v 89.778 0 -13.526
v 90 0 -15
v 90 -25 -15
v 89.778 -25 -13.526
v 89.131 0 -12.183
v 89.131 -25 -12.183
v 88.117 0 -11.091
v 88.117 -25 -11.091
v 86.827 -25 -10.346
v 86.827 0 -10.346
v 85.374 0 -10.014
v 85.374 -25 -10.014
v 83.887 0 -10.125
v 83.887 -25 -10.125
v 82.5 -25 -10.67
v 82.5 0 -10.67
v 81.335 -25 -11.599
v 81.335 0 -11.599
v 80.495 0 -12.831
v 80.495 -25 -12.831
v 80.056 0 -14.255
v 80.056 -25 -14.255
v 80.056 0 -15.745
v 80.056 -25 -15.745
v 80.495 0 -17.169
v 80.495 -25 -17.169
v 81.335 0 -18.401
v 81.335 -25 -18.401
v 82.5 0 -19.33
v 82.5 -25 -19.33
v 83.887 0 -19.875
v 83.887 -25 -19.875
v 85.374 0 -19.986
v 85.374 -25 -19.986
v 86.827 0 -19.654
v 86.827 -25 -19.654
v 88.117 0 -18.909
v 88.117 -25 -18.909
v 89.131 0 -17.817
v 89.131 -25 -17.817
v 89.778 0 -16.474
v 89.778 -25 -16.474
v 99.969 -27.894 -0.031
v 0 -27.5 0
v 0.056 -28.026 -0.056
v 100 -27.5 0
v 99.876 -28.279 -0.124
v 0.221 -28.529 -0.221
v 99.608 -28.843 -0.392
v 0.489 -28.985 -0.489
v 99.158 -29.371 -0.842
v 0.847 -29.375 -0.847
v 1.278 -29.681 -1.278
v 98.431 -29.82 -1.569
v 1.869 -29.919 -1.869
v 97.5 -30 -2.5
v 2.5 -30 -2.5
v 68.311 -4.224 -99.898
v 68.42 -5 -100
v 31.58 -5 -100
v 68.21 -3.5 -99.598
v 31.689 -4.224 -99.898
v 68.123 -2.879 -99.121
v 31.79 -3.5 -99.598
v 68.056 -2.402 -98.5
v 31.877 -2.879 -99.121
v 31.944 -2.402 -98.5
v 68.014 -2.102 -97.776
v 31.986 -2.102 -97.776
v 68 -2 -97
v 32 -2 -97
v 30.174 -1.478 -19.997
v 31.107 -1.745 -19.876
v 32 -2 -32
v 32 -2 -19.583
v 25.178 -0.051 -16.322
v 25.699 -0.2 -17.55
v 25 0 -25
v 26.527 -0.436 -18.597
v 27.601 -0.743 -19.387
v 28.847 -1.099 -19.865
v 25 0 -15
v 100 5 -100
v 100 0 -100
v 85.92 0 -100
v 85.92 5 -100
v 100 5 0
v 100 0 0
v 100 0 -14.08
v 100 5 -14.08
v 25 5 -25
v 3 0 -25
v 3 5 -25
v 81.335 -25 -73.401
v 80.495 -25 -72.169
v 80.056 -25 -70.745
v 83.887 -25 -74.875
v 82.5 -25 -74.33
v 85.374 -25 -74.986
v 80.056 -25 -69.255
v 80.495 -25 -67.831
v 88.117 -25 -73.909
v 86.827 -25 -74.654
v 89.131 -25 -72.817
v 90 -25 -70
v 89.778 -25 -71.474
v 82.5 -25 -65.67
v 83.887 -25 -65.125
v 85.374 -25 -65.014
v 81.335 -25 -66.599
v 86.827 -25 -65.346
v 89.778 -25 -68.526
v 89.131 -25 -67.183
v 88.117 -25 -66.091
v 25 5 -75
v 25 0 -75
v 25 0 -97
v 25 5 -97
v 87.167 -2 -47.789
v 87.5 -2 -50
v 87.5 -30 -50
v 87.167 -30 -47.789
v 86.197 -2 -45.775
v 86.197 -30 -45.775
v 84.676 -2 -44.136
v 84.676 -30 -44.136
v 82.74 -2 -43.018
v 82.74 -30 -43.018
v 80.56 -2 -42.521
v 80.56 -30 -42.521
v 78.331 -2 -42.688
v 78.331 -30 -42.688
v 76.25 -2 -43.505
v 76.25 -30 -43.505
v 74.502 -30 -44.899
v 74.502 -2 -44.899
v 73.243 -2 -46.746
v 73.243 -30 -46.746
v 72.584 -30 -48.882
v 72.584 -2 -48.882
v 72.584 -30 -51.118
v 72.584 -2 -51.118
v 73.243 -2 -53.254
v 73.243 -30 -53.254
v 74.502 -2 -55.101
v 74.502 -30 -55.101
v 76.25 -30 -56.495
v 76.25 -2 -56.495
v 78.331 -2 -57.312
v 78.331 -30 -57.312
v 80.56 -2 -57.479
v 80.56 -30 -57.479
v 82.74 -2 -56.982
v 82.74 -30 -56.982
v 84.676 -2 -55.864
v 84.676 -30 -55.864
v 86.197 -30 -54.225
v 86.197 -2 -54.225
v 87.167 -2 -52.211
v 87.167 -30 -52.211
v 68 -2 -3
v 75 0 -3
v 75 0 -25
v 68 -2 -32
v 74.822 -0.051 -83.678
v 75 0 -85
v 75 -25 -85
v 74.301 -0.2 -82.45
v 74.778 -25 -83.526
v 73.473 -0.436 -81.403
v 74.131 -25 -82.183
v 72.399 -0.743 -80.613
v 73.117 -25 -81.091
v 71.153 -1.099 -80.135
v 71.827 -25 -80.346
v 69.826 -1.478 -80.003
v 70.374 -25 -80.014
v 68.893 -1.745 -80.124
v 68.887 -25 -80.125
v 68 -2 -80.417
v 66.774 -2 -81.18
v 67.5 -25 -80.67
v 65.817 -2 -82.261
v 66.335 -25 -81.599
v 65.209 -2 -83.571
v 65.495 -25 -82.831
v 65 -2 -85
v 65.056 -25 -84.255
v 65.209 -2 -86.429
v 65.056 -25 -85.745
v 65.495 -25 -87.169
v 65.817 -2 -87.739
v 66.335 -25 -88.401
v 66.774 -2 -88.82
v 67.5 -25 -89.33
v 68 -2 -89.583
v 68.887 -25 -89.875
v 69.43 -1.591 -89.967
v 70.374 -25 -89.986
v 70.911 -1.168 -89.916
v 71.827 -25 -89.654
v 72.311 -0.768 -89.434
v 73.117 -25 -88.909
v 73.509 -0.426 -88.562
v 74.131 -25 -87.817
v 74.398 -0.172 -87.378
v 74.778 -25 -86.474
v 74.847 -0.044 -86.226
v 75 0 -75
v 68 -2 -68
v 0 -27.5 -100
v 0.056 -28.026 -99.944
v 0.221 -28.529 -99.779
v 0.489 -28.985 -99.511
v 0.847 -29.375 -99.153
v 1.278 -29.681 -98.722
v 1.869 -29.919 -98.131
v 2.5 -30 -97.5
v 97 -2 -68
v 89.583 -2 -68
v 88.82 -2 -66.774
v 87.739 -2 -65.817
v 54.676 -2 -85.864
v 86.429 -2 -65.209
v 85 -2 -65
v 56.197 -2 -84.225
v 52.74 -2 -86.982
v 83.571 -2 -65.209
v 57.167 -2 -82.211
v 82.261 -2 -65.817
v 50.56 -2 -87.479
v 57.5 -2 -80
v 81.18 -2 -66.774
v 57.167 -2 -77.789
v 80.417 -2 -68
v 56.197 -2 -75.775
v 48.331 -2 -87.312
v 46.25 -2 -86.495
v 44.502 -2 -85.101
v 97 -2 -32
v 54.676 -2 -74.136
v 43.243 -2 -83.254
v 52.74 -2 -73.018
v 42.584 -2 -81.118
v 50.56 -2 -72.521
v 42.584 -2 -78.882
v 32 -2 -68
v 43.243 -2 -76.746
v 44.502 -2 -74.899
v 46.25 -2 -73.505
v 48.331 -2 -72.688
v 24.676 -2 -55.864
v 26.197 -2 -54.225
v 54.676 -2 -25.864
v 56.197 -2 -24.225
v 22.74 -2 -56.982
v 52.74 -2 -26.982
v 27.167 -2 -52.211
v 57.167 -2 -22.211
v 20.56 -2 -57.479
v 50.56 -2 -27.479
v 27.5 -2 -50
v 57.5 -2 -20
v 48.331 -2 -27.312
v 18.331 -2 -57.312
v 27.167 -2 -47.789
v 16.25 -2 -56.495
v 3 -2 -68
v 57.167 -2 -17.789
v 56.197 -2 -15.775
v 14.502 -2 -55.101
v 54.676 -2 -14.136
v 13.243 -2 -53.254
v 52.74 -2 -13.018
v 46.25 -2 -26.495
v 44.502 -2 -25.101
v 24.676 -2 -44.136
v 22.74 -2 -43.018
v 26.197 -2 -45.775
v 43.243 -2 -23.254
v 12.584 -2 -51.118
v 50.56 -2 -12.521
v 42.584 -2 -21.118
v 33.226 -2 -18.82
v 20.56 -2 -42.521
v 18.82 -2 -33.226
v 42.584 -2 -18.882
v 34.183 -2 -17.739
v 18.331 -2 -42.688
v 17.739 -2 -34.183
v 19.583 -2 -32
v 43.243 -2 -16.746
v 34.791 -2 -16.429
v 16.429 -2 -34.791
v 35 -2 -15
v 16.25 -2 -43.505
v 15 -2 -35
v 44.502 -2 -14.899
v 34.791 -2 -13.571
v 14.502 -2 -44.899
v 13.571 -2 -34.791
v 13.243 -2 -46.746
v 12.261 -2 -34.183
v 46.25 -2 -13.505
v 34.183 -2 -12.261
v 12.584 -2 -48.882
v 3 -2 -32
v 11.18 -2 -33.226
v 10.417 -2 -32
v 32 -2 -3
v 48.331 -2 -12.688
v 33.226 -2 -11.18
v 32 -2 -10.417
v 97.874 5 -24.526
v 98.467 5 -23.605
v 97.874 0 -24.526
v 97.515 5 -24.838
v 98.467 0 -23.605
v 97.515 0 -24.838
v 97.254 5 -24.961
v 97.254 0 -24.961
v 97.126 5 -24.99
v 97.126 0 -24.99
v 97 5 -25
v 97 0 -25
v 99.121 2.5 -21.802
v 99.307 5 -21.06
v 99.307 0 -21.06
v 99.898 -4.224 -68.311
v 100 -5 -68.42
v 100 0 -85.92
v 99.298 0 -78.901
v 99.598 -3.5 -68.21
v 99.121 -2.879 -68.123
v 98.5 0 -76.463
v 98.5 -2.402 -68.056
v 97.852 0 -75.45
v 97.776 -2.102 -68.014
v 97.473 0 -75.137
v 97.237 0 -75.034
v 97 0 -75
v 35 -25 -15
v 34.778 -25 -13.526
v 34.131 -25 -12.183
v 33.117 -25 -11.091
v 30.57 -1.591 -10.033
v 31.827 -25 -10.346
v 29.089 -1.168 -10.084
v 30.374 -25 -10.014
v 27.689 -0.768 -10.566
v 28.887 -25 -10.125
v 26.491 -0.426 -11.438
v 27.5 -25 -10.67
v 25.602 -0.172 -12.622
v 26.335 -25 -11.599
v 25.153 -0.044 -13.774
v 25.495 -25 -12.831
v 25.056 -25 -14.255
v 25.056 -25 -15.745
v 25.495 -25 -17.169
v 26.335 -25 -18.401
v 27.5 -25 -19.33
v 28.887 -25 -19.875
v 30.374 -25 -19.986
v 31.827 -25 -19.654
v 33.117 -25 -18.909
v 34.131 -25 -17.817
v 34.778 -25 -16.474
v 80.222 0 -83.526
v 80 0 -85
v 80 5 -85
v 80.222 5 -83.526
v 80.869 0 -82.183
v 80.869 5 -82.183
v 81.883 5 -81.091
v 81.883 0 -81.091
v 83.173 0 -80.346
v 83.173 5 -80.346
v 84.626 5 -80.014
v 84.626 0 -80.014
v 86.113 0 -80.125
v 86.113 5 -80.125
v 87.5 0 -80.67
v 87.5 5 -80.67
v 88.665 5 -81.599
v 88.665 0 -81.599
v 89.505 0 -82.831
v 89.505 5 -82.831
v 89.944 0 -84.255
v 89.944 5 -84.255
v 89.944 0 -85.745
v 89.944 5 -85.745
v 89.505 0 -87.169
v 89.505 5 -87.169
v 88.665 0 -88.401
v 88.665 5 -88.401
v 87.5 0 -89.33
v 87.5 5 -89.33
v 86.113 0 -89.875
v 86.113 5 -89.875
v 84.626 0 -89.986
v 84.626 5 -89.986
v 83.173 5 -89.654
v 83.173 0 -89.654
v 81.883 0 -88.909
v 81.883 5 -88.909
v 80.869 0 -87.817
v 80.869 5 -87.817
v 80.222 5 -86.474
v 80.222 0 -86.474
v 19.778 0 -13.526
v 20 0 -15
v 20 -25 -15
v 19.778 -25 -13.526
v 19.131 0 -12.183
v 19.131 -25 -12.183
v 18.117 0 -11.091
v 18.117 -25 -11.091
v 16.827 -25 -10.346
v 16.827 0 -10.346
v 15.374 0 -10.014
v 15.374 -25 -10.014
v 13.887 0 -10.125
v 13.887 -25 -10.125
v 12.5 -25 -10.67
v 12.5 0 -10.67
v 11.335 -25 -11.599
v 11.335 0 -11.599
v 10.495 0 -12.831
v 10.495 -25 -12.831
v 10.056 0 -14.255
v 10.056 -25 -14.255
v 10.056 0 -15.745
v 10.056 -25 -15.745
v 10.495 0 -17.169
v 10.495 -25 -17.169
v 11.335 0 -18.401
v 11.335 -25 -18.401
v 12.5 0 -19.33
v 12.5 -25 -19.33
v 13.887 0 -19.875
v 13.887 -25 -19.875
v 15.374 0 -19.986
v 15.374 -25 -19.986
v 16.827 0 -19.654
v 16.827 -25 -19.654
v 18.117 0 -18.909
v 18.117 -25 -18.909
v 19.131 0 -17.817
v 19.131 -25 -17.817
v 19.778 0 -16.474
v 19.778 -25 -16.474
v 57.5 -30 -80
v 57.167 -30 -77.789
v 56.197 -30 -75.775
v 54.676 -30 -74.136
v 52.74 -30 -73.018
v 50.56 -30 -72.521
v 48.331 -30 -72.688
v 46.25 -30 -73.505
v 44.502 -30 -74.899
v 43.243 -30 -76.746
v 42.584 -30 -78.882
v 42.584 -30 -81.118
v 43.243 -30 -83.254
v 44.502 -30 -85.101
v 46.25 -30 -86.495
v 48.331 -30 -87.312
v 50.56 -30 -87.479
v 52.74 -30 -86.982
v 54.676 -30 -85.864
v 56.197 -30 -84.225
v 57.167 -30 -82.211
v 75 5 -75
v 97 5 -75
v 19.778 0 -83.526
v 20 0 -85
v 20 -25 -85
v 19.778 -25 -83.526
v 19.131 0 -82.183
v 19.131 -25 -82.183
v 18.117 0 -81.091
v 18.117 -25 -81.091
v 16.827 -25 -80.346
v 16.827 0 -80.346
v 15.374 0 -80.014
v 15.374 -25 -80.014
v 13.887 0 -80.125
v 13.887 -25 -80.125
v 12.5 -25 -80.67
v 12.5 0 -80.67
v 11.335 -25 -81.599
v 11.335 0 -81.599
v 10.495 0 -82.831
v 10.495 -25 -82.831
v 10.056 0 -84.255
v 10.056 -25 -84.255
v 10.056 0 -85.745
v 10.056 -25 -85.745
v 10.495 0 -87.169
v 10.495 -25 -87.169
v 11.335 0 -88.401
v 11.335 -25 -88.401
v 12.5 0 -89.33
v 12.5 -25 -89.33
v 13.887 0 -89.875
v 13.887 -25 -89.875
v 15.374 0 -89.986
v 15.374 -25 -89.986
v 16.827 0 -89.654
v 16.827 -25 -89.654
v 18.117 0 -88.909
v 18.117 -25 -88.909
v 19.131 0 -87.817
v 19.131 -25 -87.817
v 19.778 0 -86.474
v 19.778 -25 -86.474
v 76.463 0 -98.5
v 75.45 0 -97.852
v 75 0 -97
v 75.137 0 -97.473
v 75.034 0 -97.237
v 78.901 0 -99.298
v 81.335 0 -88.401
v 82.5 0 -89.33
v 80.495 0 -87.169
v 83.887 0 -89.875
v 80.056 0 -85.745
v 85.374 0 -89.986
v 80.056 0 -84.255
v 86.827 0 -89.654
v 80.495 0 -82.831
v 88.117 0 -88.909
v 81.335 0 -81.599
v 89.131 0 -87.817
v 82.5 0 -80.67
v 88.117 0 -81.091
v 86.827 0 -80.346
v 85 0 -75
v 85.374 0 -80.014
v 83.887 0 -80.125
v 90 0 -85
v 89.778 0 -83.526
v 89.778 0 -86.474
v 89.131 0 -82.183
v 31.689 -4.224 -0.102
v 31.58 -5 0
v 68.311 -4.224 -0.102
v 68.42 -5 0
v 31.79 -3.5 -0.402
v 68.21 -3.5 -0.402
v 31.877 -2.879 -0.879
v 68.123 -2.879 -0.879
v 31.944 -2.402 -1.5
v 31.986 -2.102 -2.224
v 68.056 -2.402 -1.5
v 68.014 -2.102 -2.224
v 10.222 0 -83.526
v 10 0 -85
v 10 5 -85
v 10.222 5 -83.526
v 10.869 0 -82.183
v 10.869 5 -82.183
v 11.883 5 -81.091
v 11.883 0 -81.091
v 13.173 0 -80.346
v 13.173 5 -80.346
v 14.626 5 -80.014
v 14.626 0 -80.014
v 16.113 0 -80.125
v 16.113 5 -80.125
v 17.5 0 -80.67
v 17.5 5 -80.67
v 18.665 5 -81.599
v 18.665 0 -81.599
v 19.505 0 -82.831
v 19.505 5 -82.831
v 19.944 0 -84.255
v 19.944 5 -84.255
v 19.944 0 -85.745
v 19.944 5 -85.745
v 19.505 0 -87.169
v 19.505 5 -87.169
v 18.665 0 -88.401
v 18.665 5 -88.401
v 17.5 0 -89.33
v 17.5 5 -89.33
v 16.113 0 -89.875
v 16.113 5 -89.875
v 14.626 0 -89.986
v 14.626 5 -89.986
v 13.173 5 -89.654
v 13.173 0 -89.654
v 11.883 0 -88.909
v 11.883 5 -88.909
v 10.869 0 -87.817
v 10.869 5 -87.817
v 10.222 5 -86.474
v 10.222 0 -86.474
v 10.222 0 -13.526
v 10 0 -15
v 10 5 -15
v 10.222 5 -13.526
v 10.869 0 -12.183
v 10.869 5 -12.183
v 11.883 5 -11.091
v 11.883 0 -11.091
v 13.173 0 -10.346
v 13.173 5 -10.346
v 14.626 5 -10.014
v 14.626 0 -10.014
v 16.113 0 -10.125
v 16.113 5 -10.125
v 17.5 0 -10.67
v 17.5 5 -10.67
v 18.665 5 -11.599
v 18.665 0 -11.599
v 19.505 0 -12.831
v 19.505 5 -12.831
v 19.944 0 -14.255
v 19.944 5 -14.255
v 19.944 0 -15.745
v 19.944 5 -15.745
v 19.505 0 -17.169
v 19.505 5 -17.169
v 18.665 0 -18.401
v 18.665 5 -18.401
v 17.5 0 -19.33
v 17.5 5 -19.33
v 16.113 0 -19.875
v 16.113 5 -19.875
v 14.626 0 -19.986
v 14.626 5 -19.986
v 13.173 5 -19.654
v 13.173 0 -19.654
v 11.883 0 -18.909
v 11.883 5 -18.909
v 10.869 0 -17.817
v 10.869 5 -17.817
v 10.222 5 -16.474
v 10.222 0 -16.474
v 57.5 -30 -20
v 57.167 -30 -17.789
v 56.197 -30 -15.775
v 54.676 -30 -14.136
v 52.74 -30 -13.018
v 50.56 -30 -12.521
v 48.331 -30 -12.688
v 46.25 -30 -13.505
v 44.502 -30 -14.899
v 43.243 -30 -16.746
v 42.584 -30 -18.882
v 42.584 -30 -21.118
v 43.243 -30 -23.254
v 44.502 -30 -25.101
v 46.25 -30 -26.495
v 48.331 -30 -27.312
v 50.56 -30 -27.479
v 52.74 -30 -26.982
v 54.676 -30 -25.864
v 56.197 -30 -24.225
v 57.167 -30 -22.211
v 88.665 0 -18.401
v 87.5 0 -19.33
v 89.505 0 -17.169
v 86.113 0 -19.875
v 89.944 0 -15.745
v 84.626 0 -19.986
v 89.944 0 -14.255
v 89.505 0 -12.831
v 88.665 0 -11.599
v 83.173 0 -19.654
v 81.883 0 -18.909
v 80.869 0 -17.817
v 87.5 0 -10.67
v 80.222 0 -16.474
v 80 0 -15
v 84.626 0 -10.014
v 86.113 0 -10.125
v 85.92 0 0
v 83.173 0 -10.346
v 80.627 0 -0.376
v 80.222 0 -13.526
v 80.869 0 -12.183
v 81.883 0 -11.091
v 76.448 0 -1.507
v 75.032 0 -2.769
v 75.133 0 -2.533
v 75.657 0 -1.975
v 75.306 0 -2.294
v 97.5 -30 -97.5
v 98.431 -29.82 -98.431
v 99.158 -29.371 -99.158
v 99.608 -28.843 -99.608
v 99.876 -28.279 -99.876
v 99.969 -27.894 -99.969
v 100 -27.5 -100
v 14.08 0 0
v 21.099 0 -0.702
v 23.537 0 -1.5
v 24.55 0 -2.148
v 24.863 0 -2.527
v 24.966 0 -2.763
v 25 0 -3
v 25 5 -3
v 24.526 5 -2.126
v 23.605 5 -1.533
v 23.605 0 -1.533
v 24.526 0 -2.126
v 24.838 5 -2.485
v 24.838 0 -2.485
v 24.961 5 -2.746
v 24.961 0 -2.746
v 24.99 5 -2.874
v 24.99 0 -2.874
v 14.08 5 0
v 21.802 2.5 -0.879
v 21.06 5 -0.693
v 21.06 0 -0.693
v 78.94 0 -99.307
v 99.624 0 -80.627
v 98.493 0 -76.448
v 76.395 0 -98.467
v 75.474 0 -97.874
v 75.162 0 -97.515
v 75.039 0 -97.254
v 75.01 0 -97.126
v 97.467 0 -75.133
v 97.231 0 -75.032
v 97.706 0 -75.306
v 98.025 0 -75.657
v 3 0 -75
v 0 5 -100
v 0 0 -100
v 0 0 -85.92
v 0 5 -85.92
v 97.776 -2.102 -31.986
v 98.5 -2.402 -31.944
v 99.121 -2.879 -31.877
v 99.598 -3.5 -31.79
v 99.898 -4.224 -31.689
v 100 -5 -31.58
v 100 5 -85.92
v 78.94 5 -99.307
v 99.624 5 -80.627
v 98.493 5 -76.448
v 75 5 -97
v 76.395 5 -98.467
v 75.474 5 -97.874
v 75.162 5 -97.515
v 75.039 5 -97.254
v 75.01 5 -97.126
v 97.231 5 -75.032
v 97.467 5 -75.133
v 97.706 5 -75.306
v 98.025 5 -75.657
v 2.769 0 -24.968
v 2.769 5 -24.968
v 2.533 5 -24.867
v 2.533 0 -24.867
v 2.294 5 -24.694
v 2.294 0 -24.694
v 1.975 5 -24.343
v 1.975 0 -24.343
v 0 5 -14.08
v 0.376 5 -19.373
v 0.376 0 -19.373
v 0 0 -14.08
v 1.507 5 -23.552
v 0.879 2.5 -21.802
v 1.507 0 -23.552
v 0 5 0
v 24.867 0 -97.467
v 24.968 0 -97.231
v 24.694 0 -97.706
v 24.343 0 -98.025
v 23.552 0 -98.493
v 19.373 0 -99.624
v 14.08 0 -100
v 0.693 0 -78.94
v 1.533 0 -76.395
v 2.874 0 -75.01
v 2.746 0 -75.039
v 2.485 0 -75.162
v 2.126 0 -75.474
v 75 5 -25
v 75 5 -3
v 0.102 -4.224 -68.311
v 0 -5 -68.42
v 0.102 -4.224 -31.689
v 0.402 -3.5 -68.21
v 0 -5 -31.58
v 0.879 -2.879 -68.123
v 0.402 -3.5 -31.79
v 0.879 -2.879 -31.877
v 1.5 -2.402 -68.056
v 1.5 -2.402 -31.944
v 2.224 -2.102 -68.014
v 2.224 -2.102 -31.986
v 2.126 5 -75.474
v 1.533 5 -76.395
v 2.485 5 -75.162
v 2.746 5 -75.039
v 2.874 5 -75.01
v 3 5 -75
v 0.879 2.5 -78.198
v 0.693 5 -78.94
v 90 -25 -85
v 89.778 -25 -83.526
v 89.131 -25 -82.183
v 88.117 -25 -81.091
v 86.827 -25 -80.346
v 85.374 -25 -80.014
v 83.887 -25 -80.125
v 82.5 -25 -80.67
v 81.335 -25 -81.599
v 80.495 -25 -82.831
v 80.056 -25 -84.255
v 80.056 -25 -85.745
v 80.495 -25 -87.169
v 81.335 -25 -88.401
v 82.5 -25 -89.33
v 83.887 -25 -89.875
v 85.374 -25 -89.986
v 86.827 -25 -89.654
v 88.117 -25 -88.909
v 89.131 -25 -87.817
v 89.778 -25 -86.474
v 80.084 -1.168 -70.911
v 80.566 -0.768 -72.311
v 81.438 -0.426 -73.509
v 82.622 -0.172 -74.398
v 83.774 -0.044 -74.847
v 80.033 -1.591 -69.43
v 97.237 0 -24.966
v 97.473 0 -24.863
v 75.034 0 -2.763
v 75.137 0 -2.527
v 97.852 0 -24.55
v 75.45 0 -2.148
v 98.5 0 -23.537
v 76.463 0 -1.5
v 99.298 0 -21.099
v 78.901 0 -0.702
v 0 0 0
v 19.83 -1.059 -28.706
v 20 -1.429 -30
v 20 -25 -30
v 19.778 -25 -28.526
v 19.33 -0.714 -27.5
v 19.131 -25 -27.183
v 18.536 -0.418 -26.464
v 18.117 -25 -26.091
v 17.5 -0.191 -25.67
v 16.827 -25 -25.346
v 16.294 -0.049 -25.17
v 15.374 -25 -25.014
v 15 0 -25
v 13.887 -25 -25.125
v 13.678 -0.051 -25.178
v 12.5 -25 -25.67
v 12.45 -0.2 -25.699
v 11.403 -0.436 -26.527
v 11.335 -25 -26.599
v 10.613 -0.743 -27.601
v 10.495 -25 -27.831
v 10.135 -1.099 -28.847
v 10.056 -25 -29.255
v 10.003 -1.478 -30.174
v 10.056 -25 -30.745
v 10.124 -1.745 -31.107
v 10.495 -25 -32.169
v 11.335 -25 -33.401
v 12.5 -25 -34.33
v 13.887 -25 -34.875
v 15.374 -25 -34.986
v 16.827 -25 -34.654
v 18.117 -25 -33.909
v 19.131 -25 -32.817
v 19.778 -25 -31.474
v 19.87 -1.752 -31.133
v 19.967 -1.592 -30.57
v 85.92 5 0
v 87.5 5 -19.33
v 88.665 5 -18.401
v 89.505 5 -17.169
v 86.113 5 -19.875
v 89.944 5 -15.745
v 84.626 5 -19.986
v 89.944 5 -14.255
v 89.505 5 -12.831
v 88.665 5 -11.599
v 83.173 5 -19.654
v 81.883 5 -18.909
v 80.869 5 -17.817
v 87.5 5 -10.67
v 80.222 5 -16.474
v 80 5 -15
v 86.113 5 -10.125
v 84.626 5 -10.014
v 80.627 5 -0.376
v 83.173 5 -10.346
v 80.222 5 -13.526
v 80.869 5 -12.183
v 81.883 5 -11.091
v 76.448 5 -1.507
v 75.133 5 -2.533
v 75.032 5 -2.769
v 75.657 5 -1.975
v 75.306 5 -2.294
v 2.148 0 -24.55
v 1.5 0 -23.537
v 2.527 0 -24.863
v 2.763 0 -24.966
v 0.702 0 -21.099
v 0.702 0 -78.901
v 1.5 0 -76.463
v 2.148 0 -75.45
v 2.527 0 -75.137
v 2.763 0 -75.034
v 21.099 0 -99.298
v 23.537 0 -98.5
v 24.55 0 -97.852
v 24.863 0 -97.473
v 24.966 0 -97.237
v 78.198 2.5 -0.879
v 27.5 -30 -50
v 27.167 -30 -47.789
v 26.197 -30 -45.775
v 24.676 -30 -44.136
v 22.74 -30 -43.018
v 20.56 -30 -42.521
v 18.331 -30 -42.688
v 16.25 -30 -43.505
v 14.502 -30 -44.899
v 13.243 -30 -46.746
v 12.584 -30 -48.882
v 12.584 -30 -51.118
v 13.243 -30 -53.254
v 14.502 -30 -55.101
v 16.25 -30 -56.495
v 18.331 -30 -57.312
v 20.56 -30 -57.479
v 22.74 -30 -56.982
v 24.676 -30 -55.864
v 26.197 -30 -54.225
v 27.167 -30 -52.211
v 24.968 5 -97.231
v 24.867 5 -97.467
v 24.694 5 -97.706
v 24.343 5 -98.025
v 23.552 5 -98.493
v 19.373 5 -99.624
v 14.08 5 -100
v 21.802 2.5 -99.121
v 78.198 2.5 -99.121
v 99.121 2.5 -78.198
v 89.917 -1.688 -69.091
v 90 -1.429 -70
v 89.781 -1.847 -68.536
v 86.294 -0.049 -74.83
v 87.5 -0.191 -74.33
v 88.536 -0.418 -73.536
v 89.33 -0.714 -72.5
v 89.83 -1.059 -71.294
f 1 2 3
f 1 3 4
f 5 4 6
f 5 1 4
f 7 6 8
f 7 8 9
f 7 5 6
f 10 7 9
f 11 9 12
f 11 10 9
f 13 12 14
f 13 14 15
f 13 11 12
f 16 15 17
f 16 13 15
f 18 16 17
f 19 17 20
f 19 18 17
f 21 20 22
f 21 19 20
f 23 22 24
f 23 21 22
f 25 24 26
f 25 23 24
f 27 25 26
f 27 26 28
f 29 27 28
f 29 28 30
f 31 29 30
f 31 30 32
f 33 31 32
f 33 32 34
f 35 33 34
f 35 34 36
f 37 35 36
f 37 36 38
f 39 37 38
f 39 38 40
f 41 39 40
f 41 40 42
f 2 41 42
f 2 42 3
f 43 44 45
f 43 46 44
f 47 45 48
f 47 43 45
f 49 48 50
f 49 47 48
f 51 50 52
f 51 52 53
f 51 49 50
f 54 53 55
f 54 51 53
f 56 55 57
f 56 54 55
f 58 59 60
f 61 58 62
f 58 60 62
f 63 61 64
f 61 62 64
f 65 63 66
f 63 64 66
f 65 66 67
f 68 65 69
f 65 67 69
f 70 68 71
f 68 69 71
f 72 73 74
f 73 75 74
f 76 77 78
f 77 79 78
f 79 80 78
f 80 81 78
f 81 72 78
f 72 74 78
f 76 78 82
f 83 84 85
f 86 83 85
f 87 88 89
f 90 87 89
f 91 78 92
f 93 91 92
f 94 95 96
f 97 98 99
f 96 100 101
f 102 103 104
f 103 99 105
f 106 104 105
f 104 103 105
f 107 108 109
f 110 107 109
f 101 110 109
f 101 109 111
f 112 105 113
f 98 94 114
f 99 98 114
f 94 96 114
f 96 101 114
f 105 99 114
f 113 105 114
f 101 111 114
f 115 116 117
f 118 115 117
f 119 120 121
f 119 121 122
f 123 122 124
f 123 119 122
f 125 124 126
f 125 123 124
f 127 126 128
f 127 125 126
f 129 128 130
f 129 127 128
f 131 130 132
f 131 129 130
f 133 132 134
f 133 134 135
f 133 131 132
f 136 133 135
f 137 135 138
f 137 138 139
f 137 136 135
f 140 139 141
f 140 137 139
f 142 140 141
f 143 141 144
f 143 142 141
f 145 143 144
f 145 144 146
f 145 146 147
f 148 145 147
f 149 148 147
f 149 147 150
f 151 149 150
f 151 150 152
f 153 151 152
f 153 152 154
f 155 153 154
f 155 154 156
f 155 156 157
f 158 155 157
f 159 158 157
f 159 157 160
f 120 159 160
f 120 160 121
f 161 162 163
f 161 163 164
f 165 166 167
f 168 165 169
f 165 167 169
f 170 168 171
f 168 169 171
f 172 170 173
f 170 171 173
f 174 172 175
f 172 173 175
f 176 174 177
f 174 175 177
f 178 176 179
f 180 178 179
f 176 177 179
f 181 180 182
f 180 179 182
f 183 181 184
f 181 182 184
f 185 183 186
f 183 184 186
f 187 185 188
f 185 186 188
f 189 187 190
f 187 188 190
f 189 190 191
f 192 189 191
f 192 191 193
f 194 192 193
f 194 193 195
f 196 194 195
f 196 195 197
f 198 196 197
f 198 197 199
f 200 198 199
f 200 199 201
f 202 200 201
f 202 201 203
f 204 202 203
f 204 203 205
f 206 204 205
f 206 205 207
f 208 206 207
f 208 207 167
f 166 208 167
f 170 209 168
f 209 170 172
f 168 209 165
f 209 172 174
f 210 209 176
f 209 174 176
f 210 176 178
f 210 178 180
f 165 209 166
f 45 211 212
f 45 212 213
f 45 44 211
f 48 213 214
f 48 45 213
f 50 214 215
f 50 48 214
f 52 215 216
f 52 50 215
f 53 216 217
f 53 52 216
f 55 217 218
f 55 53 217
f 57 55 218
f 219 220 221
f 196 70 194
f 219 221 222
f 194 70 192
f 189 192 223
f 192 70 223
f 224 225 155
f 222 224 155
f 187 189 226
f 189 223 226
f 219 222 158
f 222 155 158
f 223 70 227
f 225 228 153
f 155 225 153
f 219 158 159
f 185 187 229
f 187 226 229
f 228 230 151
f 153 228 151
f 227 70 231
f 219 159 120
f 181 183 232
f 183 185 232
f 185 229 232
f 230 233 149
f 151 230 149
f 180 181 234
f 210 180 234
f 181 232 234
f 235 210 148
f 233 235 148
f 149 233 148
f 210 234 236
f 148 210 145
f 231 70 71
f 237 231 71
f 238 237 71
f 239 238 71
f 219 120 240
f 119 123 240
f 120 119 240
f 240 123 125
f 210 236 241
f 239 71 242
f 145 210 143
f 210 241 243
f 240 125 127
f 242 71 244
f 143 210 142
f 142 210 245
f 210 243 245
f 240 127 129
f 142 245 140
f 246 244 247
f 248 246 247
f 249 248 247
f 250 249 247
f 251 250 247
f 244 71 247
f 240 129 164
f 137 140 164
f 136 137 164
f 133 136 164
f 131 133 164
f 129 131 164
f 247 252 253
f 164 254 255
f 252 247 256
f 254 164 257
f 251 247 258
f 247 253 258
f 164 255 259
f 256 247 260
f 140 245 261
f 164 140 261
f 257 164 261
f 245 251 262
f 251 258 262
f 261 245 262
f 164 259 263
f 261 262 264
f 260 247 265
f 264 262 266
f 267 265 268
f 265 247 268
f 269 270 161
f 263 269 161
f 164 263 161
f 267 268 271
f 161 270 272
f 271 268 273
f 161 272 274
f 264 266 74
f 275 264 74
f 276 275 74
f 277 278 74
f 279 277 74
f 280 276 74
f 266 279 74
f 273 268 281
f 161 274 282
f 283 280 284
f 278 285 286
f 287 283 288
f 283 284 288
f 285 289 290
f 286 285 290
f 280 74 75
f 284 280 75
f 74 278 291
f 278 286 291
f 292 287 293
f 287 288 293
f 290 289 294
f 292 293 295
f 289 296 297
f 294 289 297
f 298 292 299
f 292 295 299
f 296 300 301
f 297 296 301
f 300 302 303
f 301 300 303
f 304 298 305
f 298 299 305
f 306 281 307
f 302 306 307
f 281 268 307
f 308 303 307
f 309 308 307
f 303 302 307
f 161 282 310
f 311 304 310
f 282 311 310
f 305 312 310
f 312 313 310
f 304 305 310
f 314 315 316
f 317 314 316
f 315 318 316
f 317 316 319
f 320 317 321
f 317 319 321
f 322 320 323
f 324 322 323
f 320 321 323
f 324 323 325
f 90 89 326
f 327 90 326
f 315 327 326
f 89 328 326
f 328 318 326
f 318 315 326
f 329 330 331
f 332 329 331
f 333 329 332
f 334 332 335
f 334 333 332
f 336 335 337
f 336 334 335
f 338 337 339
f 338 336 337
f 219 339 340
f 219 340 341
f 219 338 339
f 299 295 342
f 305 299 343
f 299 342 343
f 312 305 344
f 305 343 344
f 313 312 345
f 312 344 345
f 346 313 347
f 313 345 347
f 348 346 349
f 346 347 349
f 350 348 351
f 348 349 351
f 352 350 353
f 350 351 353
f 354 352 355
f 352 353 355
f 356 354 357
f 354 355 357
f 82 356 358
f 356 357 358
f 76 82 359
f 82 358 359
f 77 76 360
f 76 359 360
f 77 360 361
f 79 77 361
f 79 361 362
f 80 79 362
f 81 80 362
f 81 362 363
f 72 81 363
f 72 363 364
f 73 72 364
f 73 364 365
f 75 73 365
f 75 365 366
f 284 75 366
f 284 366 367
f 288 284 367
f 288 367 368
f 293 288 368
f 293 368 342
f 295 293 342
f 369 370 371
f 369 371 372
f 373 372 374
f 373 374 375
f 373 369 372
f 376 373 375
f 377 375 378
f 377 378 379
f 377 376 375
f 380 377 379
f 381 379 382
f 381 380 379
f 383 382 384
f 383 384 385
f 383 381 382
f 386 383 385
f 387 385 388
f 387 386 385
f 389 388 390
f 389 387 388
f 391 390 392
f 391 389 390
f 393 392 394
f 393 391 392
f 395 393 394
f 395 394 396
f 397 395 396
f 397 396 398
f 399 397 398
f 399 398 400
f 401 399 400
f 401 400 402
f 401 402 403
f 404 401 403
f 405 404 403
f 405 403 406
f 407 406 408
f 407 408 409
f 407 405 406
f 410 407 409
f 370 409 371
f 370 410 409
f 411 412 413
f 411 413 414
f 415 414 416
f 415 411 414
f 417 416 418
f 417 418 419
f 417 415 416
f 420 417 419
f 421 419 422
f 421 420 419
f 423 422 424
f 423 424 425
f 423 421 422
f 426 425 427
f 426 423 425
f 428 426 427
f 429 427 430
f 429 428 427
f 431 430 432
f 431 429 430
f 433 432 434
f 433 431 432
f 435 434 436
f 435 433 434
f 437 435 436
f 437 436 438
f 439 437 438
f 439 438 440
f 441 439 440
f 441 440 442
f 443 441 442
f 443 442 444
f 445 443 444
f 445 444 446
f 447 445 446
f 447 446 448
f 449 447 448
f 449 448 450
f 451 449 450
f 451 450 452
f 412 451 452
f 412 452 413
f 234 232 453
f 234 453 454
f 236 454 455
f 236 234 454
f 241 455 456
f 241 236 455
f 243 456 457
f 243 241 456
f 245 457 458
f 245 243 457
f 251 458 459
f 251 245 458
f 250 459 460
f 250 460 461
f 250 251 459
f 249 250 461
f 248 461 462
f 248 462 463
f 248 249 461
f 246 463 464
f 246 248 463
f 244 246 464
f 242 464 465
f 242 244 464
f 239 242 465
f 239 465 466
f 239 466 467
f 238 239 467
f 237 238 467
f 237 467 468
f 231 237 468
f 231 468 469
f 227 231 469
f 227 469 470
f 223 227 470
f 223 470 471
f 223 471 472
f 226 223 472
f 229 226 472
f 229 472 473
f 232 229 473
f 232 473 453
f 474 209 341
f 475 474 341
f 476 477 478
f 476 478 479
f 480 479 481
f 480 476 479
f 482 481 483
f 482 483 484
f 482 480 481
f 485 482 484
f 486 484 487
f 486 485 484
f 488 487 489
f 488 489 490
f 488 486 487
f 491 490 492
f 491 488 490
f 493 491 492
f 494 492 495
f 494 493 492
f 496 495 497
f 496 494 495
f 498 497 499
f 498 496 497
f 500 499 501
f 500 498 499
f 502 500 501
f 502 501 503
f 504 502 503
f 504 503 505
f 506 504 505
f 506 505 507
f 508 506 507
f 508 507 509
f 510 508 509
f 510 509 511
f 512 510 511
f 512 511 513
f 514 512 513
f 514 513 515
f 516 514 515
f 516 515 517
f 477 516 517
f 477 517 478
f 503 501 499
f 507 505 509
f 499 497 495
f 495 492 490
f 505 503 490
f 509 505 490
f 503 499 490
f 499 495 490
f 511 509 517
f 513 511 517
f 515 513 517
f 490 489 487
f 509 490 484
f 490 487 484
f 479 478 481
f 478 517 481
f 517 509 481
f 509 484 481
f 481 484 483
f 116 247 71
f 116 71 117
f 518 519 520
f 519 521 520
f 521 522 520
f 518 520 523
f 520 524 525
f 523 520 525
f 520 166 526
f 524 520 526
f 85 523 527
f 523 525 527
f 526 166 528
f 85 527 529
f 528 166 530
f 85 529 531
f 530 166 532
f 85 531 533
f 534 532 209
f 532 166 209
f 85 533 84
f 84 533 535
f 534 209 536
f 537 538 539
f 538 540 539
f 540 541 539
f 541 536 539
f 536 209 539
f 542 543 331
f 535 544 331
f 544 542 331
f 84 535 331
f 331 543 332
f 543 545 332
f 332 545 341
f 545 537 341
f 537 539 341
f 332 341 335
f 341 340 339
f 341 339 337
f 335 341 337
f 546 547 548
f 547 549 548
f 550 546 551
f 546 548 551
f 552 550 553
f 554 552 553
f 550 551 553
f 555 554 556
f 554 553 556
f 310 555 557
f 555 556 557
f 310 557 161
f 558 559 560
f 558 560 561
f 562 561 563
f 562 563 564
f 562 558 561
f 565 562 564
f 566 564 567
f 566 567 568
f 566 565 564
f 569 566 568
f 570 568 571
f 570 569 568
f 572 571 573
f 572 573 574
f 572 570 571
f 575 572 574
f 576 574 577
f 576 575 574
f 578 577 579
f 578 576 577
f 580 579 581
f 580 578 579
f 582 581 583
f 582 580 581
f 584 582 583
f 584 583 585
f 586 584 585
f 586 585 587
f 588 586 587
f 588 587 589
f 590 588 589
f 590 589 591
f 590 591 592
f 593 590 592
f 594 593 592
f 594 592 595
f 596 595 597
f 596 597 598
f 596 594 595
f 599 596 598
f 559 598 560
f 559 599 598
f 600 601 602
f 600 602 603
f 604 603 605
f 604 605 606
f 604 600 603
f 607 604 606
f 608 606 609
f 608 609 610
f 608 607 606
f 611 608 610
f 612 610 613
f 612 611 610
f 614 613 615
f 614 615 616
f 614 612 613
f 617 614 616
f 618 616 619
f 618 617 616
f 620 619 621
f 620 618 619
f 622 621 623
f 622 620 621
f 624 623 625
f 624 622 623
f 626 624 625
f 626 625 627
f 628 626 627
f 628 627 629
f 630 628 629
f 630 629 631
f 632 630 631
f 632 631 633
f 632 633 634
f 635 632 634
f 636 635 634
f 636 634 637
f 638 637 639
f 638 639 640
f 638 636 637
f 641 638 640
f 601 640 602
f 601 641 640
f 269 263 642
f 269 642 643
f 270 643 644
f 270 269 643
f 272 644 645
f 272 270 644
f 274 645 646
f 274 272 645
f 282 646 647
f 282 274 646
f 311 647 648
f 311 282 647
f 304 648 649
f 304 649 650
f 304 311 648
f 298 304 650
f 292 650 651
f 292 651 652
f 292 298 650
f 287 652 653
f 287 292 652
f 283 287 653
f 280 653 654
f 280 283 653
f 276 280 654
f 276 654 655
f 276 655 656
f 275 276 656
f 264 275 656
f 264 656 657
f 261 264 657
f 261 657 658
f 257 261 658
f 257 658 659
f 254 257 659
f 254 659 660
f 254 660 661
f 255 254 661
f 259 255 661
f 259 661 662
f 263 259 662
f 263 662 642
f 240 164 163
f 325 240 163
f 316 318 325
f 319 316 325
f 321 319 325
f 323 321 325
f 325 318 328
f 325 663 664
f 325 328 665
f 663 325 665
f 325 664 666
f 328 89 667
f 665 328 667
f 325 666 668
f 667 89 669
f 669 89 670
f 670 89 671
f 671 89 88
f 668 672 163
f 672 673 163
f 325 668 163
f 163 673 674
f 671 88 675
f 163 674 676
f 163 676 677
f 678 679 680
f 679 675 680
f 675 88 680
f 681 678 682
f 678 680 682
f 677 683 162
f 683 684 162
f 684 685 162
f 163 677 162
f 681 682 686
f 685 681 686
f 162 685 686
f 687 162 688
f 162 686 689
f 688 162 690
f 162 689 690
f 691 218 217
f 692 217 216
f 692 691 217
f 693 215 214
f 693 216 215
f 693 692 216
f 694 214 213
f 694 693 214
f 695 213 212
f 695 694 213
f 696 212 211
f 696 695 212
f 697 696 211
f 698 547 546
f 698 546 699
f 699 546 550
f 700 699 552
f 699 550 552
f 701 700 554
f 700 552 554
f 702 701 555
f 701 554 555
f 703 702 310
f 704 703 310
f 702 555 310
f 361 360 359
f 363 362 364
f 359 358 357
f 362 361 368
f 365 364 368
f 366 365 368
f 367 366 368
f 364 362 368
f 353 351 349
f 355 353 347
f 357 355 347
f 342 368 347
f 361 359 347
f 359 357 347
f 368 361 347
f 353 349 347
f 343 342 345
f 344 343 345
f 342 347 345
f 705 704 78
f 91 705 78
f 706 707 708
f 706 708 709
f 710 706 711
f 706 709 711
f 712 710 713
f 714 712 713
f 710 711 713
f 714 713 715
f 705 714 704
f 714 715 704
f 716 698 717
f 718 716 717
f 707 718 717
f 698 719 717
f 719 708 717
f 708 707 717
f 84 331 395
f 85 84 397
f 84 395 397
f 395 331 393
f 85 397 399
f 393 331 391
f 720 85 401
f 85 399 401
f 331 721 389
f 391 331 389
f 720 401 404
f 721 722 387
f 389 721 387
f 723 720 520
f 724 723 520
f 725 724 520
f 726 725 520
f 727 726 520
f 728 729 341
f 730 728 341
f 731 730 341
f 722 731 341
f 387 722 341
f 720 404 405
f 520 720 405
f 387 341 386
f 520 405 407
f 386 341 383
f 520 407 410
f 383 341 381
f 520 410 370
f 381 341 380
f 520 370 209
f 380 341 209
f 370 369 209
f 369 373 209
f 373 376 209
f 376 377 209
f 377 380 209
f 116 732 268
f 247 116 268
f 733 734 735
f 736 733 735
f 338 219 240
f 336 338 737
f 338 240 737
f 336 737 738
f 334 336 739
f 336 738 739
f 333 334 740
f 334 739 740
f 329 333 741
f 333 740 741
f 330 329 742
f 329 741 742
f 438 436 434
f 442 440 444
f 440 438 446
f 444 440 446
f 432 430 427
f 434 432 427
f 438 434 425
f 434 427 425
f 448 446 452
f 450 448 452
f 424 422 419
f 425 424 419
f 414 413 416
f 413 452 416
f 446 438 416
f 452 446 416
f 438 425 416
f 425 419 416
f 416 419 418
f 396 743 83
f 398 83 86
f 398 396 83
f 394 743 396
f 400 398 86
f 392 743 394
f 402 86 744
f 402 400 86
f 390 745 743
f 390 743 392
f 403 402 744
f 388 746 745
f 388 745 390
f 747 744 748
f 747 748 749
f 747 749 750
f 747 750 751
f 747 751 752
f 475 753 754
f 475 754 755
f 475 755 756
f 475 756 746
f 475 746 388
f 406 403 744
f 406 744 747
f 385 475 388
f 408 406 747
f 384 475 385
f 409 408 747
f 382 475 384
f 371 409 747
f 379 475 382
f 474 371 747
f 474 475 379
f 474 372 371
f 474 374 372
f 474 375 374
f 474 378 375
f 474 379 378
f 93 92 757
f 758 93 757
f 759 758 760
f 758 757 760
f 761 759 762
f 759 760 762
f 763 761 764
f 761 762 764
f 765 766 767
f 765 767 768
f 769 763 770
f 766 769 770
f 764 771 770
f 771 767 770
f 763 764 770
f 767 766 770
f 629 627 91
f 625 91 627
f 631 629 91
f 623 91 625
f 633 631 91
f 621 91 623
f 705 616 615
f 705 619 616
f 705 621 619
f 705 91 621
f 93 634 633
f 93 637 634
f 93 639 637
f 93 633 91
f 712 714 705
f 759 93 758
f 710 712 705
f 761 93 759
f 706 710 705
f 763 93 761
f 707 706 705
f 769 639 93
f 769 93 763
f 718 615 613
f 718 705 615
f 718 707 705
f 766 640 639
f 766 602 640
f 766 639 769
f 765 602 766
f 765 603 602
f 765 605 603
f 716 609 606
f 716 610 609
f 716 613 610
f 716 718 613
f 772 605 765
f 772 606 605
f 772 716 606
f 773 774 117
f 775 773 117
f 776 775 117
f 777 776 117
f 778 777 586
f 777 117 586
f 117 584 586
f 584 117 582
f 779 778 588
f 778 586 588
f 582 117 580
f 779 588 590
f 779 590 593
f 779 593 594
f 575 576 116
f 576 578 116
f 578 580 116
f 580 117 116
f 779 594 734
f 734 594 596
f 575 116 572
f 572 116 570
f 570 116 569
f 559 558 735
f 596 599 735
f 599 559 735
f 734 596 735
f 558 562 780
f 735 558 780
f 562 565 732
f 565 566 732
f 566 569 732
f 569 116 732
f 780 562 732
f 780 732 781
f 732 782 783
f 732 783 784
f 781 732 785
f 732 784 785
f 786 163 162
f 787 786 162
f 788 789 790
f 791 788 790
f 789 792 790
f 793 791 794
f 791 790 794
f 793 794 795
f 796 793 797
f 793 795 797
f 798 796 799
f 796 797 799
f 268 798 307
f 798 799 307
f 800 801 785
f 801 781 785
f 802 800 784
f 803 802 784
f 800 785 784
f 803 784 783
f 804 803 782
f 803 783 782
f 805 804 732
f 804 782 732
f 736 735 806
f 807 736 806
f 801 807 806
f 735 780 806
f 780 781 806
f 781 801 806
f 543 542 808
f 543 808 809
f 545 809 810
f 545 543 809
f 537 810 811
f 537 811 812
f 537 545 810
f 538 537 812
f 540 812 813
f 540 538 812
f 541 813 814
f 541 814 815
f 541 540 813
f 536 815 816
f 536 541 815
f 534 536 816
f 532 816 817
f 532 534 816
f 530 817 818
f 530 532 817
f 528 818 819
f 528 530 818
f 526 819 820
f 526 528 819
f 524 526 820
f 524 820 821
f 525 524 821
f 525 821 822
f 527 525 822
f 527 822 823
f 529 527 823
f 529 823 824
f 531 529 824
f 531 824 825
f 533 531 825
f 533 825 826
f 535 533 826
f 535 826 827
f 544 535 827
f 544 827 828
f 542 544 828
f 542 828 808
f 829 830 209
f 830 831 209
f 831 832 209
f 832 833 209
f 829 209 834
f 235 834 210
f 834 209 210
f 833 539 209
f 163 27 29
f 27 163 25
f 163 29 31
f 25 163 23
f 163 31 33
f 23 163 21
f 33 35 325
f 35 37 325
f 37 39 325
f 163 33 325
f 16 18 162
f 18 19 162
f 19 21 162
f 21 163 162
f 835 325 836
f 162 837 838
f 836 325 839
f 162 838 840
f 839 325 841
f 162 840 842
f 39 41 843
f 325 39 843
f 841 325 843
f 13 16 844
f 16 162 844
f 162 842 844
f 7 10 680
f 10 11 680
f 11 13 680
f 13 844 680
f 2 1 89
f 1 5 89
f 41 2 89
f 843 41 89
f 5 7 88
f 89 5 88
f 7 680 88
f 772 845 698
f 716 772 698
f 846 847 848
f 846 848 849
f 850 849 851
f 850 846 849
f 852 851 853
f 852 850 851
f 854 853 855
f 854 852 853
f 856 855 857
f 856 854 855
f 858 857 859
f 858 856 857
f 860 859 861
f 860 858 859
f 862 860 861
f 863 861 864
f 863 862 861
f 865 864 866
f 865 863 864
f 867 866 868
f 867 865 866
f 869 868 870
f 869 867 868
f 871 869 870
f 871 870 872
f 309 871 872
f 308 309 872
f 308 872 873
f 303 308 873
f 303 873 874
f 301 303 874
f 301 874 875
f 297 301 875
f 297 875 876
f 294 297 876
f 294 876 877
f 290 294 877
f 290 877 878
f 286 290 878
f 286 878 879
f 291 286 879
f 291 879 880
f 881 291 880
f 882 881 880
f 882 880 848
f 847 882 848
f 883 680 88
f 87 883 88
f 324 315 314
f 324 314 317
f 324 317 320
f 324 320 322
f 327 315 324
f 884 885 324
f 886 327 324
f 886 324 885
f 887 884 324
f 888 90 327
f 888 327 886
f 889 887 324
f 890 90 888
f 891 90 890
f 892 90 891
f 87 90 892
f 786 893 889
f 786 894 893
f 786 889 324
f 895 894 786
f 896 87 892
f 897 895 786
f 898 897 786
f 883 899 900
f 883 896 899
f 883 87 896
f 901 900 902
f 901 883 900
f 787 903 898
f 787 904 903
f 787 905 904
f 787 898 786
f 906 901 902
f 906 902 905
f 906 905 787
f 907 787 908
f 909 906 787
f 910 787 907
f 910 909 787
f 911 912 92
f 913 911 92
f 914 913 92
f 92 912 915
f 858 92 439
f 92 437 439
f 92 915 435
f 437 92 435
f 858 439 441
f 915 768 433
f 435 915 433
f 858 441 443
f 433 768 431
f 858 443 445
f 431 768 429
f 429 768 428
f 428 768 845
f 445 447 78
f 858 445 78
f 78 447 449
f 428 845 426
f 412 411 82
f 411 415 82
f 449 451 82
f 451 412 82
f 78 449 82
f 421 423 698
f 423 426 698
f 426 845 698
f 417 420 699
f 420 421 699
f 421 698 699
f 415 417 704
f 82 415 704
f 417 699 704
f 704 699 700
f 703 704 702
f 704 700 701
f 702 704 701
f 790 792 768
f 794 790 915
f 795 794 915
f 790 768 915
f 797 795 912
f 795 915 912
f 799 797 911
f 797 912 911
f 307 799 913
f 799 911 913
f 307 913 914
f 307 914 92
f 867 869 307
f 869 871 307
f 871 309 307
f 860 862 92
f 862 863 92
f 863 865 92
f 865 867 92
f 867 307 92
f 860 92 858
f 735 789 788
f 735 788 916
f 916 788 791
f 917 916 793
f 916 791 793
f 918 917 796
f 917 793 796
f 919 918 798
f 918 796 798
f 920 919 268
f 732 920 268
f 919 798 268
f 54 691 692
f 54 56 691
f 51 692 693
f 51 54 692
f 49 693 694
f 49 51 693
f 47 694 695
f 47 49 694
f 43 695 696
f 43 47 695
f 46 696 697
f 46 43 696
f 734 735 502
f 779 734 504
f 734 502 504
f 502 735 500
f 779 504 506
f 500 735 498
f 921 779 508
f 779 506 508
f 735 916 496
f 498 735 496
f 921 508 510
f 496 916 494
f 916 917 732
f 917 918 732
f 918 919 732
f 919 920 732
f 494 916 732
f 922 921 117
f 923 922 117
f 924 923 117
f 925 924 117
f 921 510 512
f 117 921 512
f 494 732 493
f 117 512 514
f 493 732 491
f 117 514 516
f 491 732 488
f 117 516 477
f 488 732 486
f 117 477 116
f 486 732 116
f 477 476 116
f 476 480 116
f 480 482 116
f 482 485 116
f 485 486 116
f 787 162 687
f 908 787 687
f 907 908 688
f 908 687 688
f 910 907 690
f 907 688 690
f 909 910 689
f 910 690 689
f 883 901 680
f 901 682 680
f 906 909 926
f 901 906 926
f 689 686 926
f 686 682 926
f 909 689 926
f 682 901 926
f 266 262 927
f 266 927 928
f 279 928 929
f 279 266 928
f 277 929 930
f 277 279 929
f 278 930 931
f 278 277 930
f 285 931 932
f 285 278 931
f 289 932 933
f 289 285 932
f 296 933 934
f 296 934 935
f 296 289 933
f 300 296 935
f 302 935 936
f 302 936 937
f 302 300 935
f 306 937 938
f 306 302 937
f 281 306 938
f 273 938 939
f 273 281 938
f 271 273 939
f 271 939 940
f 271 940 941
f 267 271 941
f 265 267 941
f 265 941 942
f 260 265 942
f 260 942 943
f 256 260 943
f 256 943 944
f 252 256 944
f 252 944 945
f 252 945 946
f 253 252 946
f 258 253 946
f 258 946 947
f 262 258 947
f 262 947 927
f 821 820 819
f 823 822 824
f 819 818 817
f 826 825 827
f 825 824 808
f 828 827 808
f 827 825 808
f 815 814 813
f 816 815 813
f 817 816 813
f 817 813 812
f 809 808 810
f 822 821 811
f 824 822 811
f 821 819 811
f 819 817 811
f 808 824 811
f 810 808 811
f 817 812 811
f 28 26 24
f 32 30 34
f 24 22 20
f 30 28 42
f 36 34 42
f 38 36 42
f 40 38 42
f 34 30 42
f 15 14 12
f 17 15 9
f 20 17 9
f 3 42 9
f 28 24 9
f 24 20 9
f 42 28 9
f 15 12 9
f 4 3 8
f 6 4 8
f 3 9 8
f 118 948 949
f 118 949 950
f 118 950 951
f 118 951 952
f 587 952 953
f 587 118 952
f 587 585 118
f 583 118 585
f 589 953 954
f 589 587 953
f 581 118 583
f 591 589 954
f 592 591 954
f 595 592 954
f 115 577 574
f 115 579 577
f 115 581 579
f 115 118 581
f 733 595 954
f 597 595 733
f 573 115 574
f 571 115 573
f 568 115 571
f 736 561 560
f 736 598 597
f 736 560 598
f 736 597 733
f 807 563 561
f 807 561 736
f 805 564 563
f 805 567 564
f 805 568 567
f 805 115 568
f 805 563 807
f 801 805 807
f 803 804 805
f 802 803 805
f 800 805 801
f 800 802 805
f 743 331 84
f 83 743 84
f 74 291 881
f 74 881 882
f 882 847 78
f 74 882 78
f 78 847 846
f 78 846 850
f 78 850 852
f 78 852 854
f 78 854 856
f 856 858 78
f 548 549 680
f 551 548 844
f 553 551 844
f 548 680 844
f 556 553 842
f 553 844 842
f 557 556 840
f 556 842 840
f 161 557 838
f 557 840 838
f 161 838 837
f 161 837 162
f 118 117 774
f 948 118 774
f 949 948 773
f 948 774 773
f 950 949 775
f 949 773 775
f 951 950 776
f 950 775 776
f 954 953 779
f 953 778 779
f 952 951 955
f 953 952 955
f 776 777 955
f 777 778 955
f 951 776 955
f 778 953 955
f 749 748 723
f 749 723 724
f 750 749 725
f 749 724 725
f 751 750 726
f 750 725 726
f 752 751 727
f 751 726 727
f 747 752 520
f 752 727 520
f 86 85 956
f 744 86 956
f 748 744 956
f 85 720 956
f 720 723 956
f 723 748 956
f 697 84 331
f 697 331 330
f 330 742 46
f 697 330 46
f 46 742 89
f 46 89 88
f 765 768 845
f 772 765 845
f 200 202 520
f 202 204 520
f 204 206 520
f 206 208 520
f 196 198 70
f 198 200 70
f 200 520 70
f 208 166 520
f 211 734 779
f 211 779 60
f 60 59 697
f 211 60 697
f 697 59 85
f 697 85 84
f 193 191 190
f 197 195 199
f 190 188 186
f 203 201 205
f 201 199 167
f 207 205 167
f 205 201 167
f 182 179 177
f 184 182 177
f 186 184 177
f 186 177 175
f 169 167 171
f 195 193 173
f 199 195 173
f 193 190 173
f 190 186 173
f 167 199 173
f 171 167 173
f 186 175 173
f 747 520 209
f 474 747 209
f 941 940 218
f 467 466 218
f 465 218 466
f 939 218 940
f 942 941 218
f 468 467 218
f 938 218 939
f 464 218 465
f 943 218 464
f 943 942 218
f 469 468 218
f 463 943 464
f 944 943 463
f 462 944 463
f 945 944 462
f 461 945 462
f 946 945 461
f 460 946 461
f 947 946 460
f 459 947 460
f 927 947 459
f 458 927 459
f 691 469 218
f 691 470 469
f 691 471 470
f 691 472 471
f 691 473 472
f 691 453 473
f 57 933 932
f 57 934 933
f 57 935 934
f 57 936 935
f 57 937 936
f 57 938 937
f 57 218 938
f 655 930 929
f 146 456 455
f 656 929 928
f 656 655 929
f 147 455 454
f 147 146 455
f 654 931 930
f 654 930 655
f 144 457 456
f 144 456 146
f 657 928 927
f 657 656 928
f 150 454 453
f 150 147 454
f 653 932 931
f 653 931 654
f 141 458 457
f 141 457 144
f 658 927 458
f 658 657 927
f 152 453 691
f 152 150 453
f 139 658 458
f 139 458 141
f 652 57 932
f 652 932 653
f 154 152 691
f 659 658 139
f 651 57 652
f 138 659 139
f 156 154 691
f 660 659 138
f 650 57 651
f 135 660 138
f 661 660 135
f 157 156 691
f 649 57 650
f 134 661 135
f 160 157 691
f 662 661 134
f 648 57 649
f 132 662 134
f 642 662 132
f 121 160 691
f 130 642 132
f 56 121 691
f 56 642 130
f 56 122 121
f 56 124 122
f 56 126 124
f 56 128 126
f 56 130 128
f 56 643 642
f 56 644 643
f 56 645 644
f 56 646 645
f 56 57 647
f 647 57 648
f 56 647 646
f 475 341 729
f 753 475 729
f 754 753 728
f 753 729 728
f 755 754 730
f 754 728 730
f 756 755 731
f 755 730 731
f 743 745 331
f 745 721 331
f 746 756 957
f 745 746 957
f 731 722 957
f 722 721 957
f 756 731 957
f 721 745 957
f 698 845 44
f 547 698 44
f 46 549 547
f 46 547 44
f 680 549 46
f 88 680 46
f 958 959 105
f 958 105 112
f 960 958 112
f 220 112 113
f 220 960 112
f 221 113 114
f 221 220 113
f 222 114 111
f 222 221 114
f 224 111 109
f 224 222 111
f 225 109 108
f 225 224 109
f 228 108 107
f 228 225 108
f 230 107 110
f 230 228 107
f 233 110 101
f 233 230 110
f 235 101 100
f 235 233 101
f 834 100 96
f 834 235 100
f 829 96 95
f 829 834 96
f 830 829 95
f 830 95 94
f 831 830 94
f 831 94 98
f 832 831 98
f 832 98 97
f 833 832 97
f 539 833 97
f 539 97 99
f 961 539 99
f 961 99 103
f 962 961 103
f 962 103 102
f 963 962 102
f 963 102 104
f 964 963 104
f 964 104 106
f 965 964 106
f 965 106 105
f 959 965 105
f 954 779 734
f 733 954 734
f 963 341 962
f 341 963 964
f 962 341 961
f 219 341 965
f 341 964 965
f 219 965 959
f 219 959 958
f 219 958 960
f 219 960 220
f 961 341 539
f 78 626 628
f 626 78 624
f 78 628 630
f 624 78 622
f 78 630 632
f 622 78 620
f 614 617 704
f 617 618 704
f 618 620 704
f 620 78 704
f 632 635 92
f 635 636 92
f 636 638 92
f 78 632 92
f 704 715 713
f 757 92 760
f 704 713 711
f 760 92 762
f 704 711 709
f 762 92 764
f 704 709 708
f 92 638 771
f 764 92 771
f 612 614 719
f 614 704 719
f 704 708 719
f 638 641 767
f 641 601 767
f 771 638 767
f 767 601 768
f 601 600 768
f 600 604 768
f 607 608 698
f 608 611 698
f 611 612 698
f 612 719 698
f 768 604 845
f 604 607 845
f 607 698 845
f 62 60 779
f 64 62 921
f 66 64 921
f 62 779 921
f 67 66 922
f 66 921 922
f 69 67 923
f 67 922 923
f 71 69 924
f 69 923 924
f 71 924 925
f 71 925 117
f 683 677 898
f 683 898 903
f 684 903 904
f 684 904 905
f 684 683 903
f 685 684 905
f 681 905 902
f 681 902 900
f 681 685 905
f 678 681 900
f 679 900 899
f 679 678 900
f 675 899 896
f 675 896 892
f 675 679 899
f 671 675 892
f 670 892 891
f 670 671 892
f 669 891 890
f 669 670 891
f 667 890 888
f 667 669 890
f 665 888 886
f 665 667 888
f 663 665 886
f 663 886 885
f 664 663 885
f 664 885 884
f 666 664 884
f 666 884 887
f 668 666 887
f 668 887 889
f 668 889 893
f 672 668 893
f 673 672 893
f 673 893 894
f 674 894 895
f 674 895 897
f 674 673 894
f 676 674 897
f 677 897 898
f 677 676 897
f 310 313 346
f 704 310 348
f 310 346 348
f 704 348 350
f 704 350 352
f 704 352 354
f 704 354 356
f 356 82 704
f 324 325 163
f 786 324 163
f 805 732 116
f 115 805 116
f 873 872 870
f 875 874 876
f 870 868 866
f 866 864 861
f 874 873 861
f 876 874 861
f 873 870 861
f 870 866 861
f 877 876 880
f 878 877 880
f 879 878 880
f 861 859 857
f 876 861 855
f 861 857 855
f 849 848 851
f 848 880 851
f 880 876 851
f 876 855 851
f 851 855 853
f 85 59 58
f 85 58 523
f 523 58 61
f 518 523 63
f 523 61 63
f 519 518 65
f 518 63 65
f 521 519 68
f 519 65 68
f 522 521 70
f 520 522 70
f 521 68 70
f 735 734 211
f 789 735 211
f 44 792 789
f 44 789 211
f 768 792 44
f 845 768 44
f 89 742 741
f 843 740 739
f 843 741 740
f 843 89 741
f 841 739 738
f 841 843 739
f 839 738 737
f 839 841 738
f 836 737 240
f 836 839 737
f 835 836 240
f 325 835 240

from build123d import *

# Parameters (mm, degrees)
F0_W      = 100
F0_H      = 100
F0_R      = 5
F0_R_2    = 7.5
F1_DEPTH  = 30
F3_DEPTH  = 100.001
F5_DEPTH  = 100.001
F6_R      = 2.5
F7_R      = 3
F8_R      = 5
F9_DEPTH  = 5
F10_R     = 5
F11_DEPTH = 35.0010001
F12_DEPTH = 5


with BuildPart() as f1:
    # F0 (on Front) → F1 (new body)
    with BuildSketch(Plane.XZ):
        with Locations((50, -50)):
            Rectangle(F0_W, F0_H)
        with Locations((15, -85)):
            Circle(F0_R, mode=Mode.SUBTRACT)
        with Locations((50, -80)):
            Circle(F0_R_2, mode=Mode.SUBTRACT)
        with Locations((85, -85)):
            Circle(F0_R, mode=Mode.SUBTRACT)
        with Locations((85, -70)):
            Circle(F0_R, mode=Mode.SUBTRACT)
        with Locations((20, -50)):
            Circle(F0_R_2, mode=Mode.SUBTRACT)
        with Locations((15, -30)):
            Circle(F0_R, mode=Mode.SUBTRACT)
        with Locations((15, -15)):
            Circle(F0_R, mode=Mode.SUBTRACT)
        with Locations((80, -50)):
            Circle(F0_R_2, mode=Mode.SUBTRACT)
        with Locations((50, -20)):
            Circle(F0_R_2, mode=Mode.SUBTRACT)
        with Locations((85, -15)):
            Circle(F0_R, mode=Mode.SUBTRACT)
    extrude(amount=F1_DEPTH)

    # F2 (on face) → F3 (cut, through all)
    with BuildSketch(Plane(origin=(0, 0, -100), x_dir=(1, 0, 0), z_dir=(0, 0, -1))):
        Polygon((32, 2), (25, 0), (75, 0), (68, 2), align=None)
    extrude(amount=-F3_DEPTH, mode=Mode.SUBTRACT)

    # F4 (on face) → F5 (cut, through all)
    with BuildSketch(Plane(origin=(0, 0, 0), x_dir=(0, -1, 0), z_dir=(-1, 0, 0))):
        Polygon((2, -32), (0, -25), (0, -75), (2, -68), align=None)
    extrude(amount=-F5_DEPTH, mode=Mode.SUBTRACT)

    # F6
    f6_edges = [f1.edges().sort_by_distance(p)[0] for p in [
        (100, -30, -50),
        (50, -30, 0),
        (0, -30, -50),
        (50, -30, -100),
    ]]
    fillet(f6_edges, radius=F6_R)

    # F7
    f7_edges = [f1.edges().sort_by_distance(p)[0] for p in [
        (100, -2, -50),
        (100, -1, -28.5),
        (100, -1, -71.5),
        (0, -2, -50),
        (0, -1, -71.5),
        (0, -1, -28.5),
        (50, -2, -100),
        (71.5, -1, -100),
        (28.5, -1, -100),
        (50, -2, 0),
        (71.5, -1, 0),
        (28.5, -1, 0),
    ]]
    fillet(f7_edges, radius=F7_R)

    # F10 (on face) → F11 (cut, through all)
    with BuildSketch(Plane.XZ.offset(30)):
        with Locations((30, -15)):
            Circle(F10_R)
        with Locations((70, -85)):
            Circle(F10_R)
    extrude(amount=-F11_DEPTH, mode=Mode.SUBTRACT)

    # F10 (on face) → F12 (join)
    with BuildSketch(Plane.XZ.offset(30)):
        with Locations((85, -85)):
            Circle(F10_R)
        with Locations((15, -85)):
            Circle(F10_R)
        with Locations((15, -15)):
            Circle(F10_R)
        with Locations((85, -15)):
            Circle(F10_R)
        with Locations((30, -15)):
            Circle(F10_R)
        with Locations((70, -85)):
            Circle(F10_R)
        with Locations((85, -70)):
            Circle(F10_R)
        with Locations((15, -30)):
            Circle(F10_R)
    extrude(amount=-F12_DEPTH)


with BuildPart() as f9:
    # F8 (on face) → F9 (new body)
    with BuildSketch(Plane(origin=(0, 0, 0), x_dir=(-1, 0, 0), z_dir=(0, 1, 0))):
        with BuildLine():
            Line((-85.9201648339, 0), (-100, 0))
            Line((-100, 0), (-100, -14.0798351661))
            add(Edge.make_bspline(
                [(-100, -14.0798351661), (-100, -25), (-97, -25)],
                knots=[1.5707963268, 1.5707963268, 1.5707963268, 3.1415926536, 3.1415926536, 3.1415926536], degree=2, weights=[1, 0.7071067812, 1]))
            Line((-97, -25), (-75, -25))
            Line((-75, -25), (-75, -3))
            add(Edge.make_bspline(
                [(-75, -3), (-75, 0), (-85.9201648339, 0)],
                knots=[0, 0, 0, 1.5707963268, 1.5707963268, 1.5707963268], degree=2, weights=[1, 0.7071067812, 1]))
        make_face()
        with Locations((-85, -15)):
            Circle(F8_R, mode=Mode.SUBTRACT)
    extrude(amount=F9_DEPTH)


with BuildPart() as f9b:
    # F8 (on face) → F9, piece 2 (new body)
    with BuildSketch(Plane(origin=(0, 0, 0), x_dir=(-1, 0, 0), z_dir=(0, 1, 0))):
        with BuildLine():
            Line((-25, -25), (-15, -25))
            Line((-15, -25), (-3, -25))
            add(Edge.make_bspline(
                [(-3, -25), (0, -25), (0, -14.0798351661)],
                knots=[3.1415926536, 3.1415926536, 3.1415926536, 4.7123889804, 4.7123889804, 4.7123889804], degree=2, weights=[1, 0.7071067812, 1]))
            Line((0, -14.0798351661), (0, 0))
            Line((0, 0), (-14.0798351661, 0))
            add(Edge.make_bspline(
                [(-14.0798351661, 0), (-25, 0), (-25, -3)],
                knots=[1.5707963268, 1.5707963268, 1.5707963268, 3.1415926536, 3.1415926536, 3.1415926536], degree=2, weights=[1, 0.7071067812, 1]))
            Line((-25, -3), (-25, -25))
        make_face()
        with Locations((-15, -15)):
            Circle(F8_R, mode=Mode.SUBTRACT)
    extrude(amount=F9_DEPTH)


with BuildPart() as f9c:
    # F8 (on face) → F9, piece 3 (new body)
    with BuildSketch(Plane(origin=(0, 0, 0), x_dir=(-1, 0, 0), z_dir=(0, 1, 0))):
        with BuildLine():
            Line((-14.0798351661, -100), (0, -100))
            Line((0, -100), (0, -85.9201648339))
            add(Edge.make_bspline(
                [(0, -85.9201648339), (0, -75), (-3, -75)],
                knots=[4.7123889804, 4.7123889804, 4.7123889804, 6.2831853072, 6.2831853072, 6.2831853072], degree=2, weights=[1, 0.7071067812, 1]))
            Line((-3, -75), (-25, -75))
            Line((-25, -75), (-25, -97))
            add(Edge.make_bspline(
                [(-25, -97), (-25, -100), (-14.0798351661, -100)],
                knots=[3.1415926536, 3.1415926536, 3.1415926536, 4.7123889804, 4.7123889804, 4.7123889804], degree=2, weights=[1, 0.7071067812, 1]))
        make_face()
        with Locations((-15, -85)):
            Circle(F8_R, mode=Mode.SUBTRACT)
    extrude(amount=F9_DEPTH)


with BuildPart() as f9d:
    # F8 (on face) → F9, piece 4 (new body)
    with BuildSketch(Plane(origin=(0, 0, 0), x_dir=(-1, 0, 0), z_dir=(0, 1, 0))):
        with BuildLine():
            Line((-75, -75), (-85, -75))
            Line((-85, -75), (-97, -75))
            add(Edge.make_bspline(
                [(-97, -75), (-100, -75), (-100, -85.9201648339)],
                knots=[0, 0, 0, 1.5707963268, 1.5707963268, 1.5707963268], degree=2, weights=[1, 0.7071067812, 1]))
            Line((-100, -85.9201648339), (-100, -100))
            Line((-100, -100), (-85.9201648339, -100))
            add(Edge.make_bspline(
                [(-85.9201648339, -100), (-75, -100), (-75, -97)],
                knots=[4.7123889804, 4.7123889804, 4.7123889804, 6.2831853072, 6.2831853072, 6.2831853072], degree=2, weights=[1, 0.7071067812, 1]))
            Line((-75, -97), (-75, -75))
        make_face()
        with Locations((-85, -85)):
            Circle(F8_R, mode=Mode.SUBTRACT)
    extrude(amount=F9_DEPTH)


solid = Compound([f1.part, f9.part, f9b.part, f9c.part, f9d.part])
